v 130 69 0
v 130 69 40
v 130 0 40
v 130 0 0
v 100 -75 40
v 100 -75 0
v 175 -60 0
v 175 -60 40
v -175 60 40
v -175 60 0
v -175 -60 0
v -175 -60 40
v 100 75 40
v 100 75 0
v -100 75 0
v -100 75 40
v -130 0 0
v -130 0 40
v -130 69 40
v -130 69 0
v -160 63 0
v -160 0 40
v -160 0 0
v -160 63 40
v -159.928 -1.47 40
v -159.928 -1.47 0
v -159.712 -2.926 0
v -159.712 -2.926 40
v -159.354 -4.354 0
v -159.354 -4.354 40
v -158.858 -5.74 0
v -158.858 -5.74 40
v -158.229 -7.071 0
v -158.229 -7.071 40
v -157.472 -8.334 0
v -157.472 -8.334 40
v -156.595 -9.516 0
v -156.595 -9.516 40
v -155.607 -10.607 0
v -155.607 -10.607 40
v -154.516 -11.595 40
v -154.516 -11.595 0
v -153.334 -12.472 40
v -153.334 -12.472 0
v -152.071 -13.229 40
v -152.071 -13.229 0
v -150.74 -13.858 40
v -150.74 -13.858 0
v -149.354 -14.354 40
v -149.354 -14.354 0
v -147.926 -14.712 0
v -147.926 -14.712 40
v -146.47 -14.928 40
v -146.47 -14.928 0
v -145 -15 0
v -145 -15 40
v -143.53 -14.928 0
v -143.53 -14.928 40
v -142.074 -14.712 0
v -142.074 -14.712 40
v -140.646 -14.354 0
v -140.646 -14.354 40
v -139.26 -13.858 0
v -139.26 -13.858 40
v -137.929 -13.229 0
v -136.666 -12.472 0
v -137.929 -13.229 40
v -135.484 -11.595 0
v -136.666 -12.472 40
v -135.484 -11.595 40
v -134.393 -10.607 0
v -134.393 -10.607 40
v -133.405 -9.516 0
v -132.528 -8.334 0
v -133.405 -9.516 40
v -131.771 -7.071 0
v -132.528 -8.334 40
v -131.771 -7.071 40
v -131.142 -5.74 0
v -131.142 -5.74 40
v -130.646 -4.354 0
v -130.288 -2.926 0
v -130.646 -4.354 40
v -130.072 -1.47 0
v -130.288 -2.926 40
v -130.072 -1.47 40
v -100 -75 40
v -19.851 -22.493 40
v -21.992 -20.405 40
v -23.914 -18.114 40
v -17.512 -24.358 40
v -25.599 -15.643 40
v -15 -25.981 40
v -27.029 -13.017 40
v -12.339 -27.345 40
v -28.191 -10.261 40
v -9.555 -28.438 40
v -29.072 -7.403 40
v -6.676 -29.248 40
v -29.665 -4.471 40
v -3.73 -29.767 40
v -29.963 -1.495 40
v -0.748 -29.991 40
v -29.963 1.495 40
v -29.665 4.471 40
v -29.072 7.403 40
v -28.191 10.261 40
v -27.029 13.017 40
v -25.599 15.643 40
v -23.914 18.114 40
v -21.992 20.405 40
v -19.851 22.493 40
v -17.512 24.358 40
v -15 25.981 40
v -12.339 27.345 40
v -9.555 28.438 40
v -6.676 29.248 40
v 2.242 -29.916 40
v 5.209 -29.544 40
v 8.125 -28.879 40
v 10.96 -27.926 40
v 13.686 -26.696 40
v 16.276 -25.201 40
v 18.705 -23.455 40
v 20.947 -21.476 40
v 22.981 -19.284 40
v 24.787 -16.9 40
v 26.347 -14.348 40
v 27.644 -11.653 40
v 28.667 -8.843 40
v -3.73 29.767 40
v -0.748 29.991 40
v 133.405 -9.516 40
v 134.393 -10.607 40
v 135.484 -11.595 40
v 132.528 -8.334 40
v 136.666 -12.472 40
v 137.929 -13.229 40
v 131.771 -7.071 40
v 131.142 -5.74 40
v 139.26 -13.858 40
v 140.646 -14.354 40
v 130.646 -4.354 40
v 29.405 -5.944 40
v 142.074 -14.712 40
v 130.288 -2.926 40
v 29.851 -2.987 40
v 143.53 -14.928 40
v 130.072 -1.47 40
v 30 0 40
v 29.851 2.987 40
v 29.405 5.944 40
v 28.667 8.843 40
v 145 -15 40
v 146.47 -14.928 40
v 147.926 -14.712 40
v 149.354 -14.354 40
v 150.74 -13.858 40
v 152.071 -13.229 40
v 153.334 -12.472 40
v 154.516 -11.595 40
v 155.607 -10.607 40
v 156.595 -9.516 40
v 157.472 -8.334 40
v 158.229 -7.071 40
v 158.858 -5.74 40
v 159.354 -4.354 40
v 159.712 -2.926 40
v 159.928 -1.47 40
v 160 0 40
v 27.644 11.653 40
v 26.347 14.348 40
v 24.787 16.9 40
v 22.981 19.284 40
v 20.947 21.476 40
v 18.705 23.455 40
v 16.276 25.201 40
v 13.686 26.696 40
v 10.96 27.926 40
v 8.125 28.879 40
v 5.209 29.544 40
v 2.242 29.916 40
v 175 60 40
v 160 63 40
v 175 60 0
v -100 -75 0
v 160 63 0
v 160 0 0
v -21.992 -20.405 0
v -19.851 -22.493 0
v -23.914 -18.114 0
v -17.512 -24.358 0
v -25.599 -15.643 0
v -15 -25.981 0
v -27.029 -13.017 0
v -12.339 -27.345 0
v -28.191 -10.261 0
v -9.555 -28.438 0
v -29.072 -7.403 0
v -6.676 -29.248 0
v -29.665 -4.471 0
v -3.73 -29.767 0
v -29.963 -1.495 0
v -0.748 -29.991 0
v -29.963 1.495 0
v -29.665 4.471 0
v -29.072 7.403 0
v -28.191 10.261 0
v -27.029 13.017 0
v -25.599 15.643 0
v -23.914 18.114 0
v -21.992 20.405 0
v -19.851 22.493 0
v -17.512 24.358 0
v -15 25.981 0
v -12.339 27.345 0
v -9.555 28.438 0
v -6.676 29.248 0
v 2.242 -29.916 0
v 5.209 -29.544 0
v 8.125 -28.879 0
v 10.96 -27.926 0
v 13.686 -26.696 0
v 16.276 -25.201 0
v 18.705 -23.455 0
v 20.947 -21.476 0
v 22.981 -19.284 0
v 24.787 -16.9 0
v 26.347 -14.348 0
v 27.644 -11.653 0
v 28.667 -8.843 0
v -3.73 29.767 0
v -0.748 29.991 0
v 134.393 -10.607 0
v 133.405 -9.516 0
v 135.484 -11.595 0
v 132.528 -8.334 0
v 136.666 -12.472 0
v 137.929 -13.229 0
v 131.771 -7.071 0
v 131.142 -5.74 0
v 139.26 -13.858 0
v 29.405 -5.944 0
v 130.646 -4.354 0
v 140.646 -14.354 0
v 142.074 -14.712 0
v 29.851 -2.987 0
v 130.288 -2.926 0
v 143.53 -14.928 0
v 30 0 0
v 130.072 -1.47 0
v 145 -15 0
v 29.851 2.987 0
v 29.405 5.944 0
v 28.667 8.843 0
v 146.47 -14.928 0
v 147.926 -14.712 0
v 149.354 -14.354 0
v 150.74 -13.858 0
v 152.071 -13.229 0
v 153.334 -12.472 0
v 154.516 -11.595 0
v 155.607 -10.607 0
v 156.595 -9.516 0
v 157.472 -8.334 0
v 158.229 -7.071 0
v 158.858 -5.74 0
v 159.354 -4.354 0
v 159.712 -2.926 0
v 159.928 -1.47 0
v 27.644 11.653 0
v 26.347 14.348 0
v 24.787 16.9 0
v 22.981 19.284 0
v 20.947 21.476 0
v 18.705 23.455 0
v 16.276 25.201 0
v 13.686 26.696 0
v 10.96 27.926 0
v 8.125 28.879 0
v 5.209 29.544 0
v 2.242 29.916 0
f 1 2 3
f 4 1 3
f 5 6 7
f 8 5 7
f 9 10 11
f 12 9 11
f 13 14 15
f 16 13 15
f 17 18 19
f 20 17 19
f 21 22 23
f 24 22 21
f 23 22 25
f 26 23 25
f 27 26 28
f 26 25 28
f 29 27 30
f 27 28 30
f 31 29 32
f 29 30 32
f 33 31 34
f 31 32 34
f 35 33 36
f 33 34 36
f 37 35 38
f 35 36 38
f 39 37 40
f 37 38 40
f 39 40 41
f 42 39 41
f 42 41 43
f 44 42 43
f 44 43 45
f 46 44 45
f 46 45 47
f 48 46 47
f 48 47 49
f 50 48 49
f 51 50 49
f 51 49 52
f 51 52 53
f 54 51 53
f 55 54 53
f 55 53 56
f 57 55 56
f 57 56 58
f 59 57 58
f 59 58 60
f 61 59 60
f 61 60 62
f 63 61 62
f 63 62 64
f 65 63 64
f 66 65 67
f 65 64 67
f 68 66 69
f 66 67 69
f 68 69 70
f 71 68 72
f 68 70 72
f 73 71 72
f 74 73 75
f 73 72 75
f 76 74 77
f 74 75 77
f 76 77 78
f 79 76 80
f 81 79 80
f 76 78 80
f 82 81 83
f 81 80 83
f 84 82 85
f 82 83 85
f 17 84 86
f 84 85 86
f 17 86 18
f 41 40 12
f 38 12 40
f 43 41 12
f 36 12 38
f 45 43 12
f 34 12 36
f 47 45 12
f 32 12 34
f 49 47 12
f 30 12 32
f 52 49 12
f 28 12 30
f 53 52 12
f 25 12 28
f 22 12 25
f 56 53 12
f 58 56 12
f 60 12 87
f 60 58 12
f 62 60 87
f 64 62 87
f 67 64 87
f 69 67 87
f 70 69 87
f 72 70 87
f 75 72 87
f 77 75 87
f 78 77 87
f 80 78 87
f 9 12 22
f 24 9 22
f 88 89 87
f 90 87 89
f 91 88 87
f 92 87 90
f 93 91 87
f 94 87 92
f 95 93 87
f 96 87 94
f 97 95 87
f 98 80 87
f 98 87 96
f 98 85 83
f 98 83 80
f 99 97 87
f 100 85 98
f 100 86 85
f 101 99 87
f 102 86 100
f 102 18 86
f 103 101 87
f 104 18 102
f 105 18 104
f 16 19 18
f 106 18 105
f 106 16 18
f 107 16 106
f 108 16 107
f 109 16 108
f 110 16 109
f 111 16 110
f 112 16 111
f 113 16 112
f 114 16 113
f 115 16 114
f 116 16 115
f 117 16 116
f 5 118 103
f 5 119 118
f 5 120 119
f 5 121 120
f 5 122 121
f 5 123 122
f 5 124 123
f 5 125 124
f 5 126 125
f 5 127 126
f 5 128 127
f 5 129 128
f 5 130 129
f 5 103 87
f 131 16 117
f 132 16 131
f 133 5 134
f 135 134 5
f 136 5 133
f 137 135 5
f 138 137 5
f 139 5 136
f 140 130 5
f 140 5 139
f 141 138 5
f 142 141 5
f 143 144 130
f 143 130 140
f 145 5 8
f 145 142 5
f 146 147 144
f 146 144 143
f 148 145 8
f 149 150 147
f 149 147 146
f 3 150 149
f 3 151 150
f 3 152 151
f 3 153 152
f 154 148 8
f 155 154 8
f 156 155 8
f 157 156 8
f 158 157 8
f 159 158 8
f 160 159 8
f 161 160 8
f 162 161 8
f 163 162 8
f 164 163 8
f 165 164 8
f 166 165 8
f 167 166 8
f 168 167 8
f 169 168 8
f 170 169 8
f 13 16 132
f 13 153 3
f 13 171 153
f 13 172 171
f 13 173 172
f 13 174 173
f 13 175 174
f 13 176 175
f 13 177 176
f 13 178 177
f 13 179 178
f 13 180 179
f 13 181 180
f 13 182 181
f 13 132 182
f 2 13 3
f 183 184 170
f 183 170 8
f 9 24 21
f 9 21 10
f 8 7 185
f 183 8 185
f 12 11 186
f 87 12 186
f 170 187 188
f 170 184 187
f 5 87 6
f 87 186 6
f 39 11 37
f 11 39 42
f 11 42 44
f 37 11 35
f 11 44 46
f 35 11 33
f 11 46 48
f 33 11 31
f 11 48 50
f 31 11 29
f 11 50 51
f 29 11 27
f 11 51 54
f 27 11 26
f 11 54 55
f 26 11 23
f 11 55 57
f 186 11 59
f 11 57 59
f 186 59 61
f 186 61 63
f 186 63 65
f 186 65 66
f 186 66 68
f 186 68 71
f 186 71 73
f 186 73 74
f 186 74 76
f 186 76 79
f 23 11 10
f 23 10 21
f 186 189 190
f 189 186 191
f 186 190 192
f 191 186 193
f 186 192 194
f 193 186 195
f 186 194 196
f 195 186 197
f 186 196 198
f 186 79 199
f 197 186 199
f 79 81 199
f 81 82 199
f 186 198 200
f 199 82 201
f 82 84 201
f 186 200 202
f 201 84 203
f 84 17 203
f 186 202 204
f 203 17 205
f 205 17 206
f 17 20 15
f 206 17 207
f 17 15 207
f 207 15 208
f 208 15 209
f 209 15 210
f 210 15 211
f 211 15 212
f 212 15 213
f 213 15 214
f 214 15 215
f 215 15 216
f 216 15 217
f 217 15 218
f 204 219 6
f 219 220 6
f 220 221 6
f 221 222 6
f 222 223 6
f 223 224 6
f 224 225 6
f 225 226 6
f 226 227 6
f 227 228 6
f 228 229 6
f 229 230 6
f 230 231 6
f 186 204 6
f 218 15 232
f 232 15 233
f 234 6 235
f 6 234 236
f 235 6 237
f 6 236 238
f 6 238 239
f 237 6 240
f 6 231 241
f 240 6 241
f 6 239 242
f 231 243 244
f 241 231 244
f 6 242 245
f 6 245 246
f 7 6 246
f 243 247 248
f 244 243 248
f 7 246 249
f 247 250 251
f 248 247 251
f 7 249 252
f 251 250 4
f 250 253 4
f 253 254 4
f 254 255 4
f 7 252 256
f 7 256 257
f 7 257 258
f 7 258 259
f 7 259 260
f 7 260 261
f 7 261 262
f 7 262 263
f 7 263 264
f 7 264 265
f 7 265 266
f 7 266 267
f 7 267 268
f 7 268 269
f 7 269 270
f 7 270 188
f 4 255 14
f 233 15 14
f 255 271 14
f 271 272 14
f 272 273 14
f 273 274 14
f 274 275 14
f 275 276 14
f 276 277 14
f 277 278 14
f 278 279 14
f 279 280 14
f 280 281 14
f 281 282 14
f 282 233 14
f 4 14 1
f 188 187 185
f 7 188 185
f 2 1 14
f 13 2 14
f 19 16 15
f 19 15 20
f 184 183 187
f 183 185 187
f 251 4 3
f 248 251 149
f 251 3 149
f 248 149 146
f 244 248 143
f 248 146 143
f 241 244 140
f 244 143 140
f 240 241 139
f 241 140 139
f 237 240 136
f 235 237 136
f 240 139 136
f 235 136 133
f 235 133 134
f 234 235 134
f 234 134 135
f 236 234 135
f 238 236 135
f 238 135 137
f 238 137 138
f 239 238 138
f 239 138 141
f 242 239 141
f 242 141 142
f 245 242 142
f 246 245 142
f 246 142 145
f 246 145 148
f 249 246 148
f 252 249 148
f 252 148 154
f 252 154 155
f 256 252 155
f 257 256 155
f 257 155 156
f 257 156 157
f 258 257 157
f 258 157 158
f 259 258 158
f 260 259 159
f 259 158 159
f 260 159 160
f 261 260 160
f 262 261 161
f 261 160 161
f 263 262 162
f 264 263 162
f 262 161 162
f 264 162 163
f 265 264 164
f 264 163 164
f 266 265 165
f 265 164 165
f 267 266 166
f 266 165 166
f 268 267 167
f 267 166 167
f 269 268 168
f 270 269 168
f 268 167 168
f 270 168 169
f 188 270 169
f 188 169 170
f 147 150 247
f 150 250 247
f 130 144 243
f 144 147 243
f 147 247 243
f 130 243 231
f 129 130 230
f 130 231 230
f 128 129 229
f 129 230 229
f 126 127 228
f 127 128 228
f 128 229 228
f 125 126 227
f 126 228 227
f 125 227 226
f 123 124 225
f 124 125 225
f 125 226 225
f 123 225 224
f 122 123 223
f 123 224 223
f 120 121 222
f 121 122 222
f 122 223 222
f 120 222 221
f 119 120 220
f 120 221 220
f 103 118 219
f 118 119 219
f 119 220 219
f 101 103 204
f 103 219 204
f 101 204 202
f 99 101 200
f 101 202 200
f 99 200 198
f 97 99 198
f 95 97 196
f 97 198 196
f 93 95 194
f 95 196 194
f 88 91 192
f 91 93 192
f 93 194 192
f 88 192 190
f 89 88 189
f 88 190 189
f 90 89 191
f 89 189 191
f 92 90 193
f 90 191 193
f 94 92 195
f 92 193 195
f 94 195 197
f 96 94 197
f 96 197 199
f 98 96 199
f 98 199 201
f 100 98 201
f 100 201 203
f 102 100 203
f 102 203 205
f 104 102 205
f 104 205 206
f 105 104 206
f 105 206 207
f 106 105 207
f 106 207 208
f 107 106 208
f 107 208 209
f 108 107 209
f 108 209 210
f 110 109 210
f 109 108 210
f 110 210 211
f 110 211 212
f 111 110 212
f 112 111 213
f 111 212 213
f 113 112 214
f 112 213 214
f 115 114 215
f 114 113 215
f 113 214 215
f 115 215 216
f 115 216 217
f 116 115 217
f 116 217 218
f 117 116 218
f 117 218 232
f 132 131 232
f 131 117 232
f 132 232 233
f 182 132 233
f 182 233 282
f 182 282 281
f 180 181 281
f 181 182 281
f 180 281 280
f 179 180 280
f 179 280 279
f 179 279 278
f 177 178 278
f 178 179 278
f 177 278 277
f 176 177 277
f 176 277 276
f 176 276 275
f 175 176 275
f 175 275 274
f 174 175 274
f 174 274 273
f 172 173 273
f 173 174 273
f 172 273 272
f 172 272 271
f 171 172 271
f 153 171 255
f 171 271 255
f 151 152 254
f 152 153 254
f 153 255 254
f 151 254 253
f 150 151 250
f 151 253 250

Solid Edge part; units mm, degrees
sketch "Sketch1" plane through (0, 0, 0) normal (0, 0, 1) x (1, 0, 0)
  line L0 (-175, 60) -> (-175, -60)
  line L1 (-175, -60) -> (-100, -75)
  line L2 (-100, -75) -> (100, -75)
  line L3 (100, -75) -> (175, -60)
  line L4 (175, -60) -> (175, 60)
  line L5 (175, 60) -> (100, 75)
  line L6 (100, 75) -> (-100, 75)
  line L7 (-100, 75) -> (-175, 60)
  circle A0 centre (0, 0) radius 30
  dimension "D1" = 75
  dimension "D2" = 75
  dimension "D3" = 350
  dimension "D4" = 200
  dimension "D5" = 120
  dimension "D6" = 60
extrude "Protrusion1" add sketch "Sketch1" along normal blind 40
sketch "Sketch2" plane through (0, 0, 40) normal (0, 0, 1) x (1, 0, 0)
  line L0 (-160, 0) -> (-160, 63)
  line L1 (-160, 63) -> (-130, 69)
  line L2 (-130, 0) -> (-130, 69)
  arc A0 (-130, 0) -> (-160, 0) centre (-145, 0) cw
extrude "ExtrudedCutout_1" cut sketch "Sketch2" against normal blind 266.7716
mirror "Mirror1" about plane through (0, 0, 0) normal (1, 0, 0) of "ExtrudedCutout_1"
